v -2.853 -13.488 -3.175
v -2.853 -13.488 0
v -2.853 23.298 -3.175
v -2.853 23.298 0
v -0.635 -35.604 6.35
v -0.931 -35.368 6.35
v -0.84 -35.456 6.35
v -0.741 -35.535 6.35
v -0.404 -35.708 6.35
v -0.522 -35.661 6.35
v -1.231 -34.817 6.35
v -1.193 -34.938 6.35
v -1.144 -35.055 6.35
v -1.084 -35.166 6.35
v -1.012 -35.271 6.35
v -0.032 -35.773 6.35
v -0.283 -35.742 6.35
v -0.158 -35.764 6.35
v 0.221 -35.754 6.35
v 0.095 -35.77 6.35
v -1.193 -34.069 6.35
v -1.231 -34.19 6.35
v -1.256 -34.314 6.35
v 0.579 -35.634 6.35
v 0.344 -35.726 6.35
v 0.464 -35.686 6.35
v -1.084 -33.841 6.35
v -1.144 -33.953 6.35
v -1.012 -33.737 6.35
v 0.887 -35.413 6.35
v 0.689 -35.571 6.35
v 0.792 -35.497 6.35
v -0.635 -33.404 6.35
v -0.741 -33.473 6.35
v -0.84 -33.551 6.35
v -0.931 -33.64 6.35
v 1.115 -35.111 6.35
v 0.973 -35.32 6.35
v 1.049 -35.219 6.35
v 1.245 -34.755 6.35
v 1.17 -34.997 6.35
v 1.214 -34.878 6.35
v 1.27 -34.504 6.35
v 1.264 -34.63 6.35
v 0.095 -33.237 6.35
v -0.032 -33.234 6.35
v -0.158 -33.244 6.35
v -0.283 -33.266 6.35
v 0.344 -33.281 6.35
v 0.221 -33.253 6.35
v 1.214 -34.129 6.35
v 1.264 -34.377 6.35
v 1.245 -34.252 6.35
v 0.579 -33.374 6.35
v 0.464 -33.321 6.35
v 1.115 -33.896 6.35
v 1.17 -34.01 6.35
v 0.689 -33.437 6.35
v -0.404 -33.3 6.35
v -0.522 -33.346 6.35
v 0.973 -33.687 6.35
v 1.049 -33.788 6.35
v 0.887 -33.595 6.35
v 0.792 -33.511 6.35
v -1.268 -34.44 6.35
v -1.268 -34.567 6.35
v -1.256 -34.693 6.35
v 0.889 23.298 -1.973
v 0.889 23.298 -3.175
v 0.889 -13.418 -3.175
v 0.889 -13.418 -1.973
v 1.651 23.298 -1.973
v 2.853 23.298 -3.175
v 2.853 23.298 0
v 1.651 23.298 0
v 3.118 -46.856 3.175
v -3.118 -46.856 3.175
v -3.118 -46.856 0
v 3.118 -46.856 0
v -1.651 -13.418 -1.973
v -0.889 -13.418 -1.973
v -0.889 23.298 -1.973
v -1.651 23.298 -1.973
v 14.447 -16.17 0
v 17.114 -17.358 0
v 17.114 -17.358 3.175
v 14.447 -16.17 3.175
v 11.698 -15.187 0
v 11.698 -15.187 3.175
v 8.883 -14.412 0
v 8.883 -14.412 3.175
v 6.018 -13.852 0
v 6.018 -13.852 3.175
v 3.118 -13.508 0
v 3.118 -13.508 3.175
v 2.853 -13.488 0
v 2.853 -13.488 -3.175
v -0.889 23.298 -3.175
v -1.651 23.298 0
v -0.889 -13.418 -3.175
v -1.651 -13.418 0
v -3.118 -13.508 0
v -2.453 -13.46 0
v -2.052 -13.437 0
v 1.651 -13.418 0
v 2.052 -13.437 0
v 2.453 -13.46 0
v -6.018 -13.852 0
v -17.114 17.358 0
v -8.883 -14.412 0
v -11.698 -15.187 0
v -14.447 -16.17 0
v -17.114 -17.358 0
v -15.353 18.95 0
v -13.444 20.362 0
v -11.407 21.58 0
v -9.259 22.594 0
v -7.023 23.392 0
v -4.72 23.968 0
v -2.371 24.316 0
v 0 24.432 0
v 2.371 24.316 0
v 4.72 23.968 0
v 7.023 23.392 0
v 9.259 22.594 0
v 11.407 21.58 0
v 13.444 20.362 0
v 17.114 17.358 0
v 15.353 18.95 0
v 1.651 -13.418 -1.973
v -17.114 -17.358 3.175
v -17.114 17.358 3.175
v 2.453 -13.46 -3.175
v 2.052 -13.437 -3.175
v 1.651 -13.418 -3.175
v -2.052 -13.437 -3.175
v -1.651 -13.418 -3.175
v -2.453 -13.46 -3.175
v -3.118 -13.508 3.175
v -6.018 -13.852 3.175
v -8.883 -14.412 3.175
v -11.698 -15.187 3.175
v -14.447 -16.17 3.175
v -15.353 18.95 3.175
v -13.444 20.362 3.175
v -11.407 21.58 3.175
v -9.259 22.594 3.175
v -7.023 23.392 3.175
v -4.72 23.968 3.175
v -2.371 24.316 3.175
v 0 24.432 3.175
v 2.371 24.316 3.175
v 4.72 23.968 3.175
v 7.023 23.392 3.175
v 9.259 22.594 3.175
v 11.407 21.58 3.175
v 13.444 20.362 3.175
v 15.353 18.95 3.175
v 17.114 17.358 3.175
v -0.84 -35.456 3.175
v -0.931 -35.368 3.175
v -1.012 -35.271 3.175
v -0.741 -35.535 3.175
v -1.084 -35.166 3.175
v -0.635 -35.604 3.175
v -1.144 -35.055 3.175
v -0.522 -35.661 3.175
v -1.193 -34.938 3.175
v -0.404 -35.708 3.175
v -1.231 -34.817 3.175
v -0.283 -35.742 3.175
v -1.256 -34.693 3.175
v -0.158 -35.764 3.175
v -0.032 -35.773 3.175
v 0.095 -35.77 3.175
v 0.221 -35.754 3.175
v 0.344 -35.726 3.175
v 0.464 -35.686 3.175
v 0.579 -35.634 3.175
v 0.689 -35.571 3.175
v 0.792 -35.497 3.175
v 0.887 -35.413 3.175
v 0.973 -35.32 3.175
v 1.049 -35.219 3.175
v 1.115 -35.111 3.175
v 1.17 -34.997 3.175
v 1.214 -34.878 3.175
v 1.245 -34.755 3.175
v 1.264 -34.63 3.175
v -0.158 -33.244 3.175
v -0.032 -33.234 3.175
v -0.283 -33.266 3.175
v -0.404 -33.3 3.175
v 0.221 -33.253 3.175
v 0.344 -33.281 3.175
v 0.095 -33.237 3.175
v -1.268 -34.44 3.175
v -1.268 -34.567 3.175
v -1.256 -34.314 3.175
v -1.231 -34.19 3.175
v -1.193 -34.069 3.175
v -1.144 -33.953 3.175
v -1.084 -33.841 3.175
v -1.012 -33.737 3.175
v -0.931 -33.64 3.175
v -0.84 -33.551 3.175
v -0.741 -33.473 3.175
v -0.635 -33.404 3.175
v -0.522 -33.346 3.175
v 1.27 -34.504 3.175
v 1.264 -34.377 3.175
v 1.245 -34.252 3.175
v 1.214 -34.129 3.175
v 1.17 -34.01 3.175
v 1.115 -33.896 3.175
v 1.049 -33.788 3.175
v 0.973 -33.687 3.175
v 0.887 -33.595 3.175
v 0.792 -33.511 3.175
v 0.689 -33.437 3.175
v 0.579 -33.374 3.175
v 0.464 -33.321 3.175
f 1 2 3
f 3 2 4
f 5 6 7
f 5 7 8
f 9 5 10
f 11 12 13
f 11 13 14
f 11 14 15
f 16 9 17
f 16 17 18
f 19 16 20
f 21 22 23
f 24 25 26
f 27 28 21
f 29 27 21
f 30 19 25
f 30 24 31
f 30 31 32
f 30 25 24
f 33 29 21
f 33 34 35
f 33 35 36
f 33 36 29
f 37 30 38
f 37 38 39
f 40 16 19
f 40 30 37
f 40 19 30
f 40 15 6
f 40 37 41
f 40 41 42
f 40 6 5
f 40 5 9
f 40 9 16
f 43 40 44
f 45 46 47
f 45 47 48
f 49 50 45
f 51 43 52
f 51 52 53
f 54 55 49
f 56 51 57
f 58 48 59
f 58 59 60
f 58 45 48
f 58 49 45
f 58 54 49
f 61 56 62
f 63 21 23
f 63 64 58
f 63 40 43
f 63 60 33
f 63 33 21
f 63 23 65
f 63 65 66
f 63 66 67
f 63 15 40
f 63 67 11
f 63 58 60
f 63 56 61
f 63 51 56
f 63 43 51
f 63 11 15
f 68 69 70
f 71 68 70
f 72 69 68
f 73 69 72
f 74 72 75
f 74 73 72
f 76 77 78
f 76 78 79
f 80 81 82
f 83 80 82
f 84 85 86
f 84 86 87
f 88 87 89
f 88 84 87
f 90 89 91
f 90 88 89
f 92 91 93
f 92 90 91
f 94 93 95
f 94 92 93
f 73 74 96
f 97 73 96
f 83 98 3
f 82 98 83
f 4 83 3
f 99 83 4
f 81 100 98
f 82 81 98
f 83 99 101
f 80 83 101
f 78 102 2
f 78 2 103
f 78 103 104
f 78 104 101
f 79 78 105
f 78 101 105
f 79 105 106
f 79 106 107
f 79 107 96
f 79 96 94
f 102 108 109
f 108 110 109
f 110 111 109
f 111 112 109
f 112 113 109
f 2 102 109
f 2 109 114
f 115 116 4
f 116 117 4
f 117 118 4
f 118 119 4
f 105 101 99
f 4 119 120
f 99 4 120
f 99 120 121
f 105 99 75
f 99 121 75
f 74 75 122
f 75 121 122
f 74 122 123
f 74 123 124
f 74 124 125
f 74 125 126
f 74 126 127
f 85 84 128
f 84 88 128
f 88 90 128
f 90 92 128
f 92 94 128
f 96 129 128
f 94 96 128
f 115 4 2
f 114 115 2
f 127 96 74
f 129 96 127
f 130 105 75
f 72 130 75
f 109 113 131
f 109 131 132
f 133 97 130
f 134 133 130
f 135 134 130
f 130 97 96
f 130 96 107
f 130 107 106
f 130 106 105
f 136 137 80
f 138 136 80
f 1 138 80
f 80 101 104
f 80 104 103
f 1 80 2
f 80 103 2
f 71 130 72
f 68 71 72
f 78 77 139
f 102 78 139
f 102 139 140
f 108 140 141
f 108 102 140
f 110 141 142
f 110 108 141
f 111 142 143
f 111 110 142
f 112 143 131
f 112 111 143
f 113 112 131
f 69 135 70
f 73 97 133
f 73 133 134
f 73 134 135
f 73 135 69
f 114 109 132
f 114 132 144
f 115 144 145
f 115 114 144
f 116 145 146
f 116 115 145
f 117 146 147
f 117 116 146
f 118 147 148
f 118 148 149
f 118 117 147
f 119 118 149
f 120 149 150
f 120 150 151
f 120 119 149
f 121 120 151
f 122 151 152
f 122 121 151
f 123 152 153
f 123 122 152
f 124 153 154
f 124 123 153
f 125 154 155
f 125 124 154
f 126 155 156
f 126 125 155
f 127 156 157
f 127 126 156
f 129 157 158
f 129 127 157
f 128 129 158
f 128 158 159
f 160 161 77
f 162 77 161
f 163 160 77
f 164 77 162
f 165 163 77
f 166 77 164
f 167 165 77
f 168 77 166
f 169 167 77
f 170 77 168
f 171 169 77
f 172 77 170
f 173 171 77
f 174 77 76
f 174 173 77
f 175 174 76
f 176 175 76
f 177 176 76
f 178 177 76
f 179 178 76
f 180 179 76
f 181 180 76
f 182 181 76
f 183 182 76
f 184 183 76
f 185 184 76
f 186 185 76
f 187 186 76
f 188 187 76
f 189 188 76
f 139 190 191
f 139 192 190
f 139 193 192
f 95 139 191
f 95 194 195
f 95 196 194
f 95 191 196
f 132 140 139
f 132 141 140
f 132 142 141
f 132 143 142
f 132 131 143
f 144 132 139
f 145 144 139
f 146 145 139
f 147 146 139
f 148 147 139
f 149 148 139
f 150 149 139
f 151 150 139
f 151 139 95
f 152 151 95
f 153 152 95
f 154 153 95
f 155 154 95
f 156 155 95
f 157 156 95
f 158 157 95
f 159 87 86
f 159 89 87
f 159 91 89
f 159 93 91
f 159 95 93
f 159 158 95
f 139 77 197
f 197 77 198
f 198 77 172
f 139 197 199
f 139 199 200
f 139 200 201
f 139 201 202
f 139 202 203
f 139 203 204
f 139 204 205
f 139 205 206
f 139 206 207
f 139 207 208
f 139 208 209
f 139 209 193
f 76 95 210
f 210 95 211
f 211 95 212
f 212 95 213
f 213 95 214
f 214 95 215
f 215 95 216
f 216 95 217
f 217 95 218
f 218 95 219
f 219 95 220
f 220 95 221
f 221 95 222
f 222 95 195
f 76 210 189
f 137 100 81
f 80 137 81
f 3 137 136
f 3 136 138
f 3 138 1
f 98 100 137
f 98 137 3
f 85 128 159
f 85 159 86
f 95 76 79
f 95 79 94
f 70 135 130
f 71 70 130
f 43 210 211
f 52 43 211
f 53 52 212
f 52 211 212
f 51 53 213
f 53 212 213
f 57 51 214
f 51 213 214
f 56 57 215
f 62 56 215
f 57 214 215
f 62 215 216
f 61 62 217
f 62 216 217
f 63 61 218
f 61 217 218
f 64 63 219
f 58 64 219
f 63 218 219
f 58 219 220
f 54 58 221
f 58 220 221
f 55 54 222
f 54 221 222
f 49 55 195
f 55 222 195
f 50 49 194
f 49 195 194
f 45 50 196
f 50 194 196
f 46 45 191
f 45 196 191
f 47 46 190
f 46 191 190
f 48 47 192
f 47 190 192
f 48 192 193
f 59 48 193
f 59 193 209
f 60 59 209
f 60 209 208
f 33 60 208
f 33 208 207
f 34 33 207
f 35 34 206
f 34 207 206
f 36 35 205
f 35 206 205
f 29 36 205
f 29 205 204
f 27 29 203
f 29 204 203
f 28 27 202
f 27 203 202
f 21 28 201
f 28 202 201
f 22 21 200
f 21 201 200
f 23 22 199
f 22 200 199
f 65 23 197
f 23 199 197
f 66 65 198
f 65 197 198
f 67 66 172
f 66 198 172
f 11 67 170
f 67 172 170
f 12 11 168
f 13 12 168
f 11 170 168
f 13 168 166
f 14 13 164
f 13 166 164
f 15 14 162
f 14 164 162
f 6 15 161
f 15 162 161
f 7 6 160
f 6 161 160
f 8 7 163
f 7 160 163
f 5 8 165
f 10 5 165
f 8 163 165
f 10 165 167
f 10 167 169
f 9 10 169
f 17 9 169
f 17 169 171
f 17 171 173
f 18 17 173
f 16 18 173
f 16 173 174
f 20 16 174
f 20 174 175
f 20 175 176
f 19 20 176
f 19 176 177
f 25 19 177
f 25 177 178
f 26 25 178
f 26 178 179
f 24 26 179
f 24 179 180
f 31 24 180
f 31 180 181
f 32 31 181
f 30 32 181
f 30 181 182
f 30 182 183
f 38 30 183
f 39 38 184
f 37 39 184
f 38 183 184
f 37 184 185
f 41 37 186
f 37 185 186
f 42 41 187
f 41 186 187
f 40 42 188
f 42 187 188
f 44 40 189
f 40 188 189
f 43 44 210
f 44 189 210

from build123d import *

# Parameters (mm, degrees)
BOSS_EXTRUDE1_DEPTH = 3.175
BOSS_EXTRUDE2_DEPTH = 3.175
SKETCH3_W           = 6.236959702
SKETCH3_H           = 47.194711522
BOSS_EXTRUDE3_DEPTH = 3.175
SKETCH4_R           = 1.27
BOSS_EXTRUDE4_DEPTH = 3.175
BOSS_EXTRUDE5_REACH = 20.766
SKETCH6_W           = 1.202138058
SKETCH6_H           = 36.716281243
CUT_EXTRUDE1_REACH  = 11.525


with BuildPart() as part:
    # Sketch1 → Boss-Extrude1 (new body)
    with BuildSketch(Plane.XY):
        with BuildLine():
            Line((-17.114253333, -17.357583949), (-17.114253333, 17.357583949))
            ThreePointArc((-17.114253333, 17.357583949), (0, 24.432200125), (17.114253333, 17.357583949))
            Line((17.114253333, 17.357583949), (17.114253333, -17.357583949))
            ThreePointArc((17.114253333, -17.357583949), (0, -13.382802691), (-17.114253333, -17.357583949))
        make_face()
    extrude(amount=BOSS_EXTRUDE1_DEPTH)

    # Sketch2 → Boss-Extrude2 (add)
    with BuildSketch(Plane(origin=(0, 0, 0), x_dir=(-1, 0, 0), z_dir=(0, 0, -1))):
        with BuildLine():
            Line((-1.65128862, -13.417928303), (-1.65128862, 22.268343179))
            Line((-1.65128862, 22.268343179), (-1.65128862, 23.29835294))
            Line((-1.65128862, 23.29835294), (-2.853426735, 23.29835294))
            Line((-2.853426735, 23.29835294), (-2.853426735, -13.48778167))
            ThreePointArc((-2.853426735, -13.48778167), (-2.25262846, -13.448194961), (-1.65128862, -13.417928303))
        make_face()
        with BuildLine():
            Line((1.65128862, 23.29835294), (1.65128862, 22.268343179))
            Line((1.65128862, 22.268343179), (1.65128862, -13.417928303))
            ThreePointArc((1.65128862, -13.417928303), (2.25262846, -13.448194961), (2.853426735, -13.48778167))
            Line((2.853426735, -13.48778167), (2.853426735, 23.29835294))
            Line((2.853426735, 23.29835294), (1.65128862, 23.29835294))
        make_face()
    extrude(amount=BOSS_EXTRUDE2_DEPTH)

    # Sketch3 → Boss-Extrude3 (add)
    with BuildSketch(Plane.XY.offset(3.175)):
        with Locations((0, -23.258467244)):
            Rectangle(SKETCH3_W, SKETCH3_H)
    extrude(amount=-BOSS_EXTRUDE3_DEPTH)

    # Sketch4 → Boss-Extrude4 (add)
    with BuildSketch(Plane.XY.offset(3.175)):
        with Locations((0, -34.503683415)):
            Circle(SKETCH4_R)
    extrude(amount=BOSS_EXTRUDE4_DEPTH)

    # Sketch6 → Boss-Extrude5 (add, up to next)
    with BuildSketch(Plane.ZY.offset(-1.65128862), mode=Mode.PRIVATE) as boss_extrude5_sk1:
        with Locations((-2.573930971, 4.940212319)):
            Rectangle(SKETCH6_W, SKETCH6_H)
    boss_extrude5_tool1 = extrude(boss_extrude5_sk1.sketch, amount=BOSS_EXTRUDE5_REACH, mode=Mode.PRIVATE) - part.part
    add(boss_extrude5_tool1.solids().sort_by_distance((1.651289, 4.940212, -2.573931))[0])

    # Sketch8 → Cut-Extrude1 (cut, up to next)
    with BuildSketch(Plane(origin=(0, 0, -3.175), x_dir=(-1, 0, 0), z_dir=(0, 0, -1)), mode=Mode.PRIVATE) as cut_extrude1_sk1:
        Polygon((0, 23.29835294), (-0.889, 23.29835294), (-0.889, -13.417928303), (0.889, -13.417928303), (0.889, 23.29835294), align=None)
    cut_extrude1_tool1 = extrude(cut_extrude1_sk1.sketch, amount=-CUT_EXTRUDE1_REACH, mode=Mode.PRIVATE) & part.part
    add(cut_extrude1_tool1.solids().sort_by_distance((0, 4.940212, -3.175))[0], mode=Mode.SUBTRACT)


solid = part.part
